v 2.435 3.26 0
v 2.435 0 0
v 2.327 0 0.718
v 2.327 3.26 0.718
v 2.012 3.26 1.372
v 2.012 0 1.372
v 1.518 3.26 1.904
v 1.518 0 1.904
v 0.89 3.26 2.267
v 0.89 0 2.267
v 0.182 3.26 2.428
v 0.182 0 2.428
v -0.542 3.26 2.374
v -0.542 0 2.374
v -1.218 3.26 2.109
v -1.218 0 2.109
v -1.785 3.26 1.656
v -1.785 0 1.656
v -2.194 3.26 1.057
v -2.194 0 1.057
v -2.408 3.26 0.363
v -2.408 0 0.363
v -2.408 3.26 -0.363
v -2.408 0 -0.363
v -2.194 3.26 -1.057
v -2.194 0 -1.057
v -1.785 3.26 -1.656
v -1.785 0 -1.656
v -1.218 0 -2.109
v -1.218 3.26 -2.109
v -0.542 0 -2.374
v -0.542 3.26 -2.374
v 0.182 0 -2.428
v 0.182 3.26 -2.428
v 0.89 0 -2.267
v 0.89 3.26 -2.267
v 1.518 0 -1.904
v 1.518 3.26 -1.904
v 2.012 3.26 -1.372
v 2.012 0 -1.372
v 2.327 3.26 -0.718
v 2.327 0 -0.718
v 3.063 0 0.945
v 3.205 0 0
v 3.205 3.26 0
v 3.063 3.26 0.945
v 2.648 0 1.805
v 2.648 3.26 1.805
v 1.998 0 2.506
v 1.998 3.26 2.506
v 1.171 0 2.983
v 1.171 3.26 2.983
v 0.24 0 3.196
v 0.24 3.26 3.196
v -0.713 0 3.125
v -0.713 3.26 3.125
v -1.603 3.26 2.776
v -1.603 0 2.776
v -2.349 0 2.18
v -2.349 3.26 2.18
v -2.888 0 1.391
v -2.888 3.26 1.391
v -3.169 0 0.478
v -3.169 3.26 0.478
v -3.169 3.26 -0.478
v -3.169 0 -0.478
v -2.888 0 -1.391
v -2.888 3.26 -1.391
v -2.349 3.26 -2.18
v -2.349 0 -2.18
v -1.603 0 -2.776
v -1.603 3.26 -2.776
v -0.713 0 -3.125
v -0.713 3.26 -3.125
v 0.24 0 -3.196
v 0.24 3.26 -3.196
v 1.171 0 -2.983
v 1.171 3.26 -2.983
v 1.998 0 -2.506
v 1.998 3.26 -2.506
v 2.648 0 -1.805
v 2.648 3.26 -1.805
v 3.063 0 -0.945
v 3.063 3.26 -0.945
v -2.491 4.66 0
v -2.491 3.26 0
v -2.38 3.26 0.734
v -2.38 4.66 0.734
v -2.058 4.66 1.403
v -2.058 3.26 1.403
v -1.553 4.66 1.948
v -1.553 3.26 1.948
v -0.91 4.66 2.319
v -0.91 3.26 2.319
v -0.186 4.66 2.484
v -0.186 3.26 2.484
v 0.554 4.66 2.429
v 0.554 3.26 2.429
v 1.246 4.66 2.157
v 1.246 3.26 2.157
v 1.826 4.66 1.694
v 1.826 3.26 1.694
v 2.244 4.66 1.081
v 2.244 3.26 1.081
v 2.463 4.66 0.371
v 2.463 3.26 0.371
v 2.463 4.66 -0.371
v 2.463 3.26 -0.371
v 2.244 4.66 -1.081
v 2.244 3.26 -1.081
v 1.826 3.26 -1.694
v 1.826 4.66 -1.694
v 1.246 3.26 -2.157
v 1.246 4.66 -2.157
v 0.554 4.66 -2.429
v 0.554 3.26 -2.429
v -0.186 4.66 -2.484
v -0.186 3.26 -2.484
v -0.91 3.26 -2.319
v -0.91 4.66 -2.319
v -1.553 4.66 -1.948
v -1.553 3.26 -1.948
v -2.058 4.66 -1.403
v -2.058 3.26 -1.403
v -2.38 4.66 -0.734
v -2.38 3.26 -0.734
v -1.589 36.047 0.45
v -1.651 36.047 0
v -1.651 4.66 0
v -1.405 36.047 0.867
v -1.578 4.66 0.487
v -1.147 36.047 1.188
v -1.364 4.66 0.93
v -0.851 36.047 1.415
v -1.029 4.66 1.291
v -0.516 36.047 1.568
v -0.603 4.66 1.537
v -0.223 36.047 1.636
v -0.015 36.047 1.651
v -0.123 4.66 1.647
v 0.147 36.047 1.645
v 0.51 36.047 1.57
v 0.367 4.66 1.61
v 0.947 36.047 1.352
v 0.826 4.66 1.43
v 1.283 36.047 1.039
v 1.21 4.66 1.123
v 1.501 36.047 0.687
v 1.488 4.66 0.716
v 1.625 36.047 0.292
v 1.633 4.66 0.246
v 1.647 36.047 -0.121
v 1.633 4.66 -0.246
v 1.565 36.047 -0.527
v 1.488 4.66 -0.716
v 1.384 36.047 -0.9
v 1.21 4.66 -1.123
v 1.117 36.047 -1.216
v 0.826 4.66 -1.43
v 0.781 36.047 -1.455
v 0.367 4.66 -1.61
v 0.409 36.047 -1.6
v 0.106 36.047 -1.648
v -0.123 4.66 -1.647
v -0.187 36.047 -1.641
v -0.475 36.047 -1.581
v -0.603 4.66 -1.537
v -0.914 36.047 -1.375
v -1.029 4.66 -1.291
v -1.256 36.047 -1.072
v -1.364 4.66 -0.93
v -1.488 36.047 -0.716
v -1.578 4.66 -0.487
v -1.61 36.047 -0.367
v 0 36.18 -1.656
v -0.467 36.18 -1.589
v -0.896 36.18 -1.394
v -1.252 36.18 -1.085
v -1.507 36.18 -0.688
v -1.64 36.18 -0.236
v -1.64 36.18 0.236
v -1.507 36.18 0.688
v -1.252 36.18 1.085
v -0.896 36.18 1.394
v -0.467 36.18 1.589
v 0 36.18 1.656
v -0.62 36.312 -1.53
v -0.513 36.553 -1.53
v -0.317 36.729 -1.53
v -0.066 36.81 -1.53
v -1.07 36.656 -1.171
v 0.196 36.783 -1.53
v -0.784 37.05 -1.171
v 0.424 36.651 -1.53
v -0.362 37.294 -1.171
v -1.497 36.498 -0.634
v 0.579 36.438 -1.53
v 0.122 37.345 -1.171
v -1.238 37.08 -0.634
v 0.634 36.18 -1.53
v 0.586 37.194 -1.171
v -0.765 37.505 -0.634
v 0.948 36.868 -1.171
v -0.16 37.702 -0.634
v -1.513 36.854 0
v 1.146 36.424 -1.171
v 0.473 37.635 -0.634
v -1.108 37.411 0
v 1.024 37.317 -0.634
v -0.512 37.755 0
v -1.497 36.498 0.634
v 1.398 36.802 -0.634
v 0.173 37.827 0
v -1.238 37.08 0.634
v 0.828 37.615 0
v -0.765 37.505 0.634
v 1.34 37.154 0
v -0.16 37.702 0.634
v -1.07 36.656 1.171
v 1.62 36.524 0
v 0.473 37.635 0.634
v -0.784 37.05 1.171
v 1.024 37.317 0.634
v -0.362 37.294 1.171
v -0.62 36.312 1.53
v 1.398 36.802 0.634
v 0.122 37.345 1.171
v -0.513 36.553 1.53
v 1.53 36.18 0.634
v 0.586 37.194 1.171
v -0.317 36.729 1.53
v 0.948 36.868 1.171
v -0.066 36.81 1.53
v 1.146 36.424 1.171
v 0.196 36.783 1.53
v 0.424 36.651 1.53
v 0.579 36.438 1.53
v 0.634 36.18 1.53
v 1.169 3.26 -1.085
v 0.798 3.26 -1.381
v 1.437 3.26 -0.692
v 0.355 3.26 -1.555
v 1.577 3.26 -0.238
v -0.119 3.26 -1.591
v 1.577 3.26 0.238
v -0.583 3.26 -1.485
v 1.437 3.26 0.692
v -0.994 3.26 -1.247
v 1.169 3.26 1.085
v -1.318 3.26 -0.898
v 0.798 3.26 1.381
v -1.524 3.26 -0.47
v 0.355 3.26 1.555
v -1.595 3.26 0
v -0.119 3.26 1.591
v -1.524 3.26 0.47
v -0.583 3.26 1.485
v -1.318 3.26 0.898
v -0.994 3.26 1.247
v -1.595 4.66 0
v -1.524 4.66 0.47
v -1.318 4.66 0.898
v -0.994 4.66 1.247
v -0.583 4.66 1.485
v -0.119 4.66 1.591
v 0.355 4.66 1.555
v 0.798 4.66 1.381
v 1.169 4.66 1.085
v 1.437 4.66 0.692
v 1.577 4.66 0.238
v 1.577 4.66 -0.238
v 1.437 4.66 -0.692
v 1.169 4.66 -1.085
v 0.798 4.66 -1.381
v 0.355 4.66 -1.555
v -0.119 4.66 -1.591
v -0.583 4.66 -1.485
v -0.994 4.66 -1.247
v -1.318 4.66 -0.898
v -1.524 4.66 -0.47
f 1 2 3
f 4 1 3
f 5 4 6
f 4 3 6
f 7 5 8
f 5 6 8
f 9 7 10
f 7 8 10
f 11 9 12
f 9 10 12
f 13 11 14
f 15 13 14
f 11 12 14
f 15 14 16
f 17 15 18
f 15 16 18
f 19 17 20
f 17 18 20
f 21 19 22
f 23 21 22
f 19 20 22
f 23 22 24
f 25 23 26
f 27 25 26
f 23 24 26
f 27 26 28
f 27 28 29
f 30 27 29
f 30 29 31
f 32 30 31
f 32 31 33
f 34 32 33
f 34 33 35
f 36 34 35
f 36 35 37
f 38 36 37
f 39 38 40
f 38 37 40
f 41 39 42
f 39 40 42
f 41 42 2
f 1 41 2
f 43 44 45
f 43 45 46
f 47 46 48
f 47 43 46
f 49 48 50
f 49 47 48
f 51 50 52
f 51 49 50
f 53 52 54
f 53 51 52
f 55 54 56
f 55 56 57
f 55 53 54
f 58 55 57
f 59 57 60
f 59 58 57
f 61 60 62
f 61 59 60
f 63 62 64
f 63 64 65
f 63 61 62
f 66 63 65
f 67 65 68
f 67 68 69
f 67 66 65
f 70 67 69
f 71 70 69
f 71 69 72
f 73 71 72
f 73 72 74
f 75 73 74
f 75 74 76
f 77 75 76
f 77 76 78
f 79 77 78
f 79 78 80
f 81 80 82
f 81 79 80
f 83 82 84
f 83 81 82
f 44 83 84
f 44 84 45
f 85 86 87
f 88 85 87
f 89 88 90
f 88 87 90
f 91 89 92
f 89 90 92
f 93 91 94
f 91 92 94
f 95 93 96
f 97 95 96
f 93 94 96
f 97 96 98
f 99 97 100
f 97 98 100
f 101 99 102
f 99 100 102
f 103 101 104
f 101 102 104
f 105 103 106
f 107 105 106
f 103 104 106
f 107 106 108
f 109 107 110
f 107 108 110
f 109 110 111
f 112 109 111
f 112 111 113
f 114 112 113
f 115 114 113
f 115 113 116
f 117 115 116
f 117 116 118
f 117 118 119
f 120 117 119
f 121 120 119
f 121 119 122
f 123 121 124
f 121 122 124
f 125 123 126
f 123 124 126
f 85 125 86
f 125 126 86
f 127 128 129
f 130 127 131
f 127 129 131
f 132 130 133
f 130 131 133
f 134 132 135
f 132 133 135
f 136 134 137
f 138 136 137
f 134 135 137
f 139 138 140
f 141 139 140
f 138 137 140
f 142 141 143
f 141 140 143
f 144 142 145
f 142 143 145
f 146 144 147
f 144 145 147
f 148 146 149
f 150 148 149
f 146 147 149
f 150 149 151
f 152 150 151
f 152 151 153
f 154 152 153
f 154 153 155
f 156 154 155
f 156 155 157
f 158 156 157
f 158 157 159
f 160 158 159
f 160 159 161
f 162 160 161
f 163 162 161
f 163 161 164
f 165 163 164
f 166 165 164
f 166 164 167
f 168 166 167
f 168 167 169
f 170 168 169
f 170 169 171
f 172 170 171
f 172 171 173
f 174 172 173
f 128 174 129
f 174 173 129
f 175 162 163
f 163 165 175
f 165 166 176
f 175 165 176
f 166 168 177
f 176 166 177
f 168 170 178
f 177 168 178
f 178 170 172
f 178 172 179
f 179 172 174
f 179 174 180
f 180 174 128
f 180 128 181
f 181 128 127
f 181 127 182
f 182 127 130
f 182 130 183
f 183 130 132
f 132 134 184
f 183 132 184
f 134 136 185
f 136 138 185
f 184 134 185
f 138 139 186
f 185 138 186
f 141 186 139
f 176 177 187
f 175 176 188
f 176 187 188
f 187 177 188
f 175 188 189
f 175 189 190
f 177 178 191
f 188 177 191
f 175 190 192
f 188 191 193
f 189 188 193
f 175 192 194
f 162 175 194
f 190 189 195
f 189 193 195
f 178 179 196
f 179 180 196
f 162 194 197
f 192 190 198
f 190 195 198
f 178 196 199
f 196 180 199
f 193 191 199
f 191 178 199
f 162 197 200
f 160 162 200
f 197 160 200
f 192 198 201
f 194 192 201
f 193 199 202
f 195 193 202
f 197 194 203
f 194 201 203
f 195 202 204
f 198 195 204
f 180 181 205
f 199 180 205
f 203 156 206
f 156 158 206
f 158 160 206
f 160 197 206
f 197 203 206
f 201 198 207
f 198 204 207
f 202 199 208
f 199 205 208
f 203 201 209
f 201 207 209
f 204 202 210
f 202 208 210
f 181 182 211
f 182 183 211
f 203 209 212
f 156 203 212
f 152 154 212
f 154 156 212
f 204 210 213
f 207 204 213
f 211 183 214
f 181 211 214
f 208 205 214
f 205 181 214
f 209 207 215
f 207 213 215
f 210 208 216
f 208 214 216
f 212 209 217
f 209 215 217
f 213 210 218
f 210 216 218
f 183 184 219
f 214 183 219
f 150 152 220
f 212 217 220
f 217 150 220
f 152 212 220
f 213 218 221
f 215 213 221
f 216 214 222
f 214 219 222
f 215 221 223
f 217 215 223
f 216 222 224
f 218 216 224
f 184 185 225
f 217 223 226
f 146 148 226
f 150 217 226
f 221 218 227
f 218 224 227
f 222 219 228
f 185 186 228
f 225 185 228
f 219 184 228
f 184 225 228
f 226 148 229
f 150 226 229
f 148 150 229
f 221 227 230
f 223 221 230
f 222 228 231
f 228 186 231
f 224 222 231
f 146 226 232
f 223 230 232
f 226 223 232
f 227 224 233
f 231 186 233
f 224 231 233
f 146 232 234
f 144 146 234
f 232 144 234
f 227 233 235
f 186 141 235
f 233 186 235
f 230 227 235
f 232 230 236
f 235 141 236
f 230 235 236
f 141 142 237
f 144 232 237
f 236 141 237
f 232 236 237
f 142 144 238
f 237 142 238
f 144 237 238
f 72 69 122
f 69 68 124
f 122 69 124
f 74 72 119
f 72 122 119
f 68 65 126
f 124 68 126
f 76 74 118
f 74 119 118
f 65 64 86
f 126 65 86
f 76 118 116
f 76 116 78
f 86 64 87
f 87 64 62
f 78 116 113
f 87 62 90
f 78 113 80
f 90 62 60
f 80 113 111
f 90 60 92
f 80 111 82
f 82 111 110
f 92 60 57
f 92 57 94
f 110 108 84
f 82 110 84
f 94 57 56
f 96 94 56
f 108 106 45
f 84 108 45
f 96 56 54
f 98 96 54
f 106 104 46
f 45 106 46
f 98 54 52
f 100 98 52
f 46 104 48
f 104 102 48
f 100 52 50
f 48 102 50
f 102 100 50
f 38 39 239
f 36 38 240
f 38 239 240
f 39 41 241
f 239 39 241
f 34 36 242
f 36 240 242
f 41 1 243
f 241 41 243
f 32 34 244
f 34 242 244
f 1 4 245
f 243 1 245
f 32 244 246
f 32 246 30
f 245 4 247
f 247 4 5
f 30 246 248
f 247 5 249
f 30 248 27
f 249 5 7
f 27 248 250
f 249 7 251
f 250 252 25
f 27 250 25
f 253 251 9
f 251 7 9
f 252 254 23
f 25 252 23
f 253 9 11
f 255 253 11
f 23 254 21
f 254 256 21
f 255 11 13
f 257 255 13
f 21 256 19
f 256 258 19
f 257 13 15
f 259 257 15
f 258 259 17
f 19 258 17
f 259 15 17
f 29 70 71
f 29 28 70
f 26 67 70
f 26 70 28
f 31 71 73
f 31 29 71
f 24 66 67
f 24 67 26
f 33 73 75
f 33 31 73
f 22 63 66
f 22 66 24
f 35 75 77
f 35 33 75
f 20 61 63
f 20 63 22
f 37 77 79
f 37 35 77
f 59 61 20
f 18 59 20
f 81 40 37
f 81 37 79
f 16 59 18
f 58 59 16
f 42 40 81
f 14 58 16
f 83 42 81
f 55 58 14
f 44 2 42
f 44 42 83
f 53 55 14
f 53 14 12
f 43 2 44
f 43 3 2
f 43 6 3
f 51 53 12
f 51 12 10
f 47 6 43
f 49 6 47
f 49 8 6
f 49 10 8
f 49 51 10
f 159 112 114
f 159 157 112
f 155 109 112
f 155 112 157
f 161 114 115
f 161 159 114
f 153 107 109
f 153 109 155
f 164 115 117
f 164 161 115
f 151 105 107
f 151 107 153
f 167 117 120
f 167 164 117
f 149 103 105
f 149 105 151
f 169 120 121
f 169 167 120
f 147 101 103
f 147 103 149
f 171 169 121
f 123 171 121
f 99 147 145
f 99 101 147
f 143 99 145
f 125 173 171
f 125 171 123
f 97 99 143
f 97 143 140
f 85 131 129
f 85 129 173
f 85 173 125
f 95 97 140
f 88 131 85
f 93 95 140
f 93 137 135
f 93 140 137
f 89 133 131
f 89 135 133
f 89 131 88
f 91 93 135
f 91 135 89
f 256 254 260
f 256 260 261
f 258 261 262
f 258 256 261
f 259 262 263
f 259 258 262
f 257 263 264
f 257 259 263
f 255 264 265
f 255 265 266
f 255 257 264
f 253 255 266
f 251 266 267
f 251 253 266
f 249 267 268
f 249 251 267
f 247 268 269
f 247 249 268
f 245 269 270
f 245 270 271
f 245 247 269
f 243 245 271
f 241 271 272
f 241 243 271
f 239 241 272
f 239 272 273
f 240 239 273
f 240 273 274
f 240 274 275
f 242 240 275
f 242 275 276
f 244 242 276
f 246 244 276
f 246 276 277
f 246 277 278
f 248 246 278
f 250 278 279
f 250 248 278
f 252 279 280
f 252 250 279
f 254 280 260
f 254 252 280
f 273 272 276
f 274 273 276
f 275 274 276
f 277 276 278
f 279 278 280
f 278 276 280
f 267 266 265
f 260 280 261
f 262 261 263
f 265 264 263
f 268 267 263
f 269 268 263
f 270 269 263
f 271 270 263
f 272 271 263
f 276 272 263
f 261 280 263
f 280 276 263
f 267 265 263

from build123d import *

# Parameters (mm, degrees)
F0_R     = 3.205
F0_R_2   = 2.435
F1_DEPTH = 3.26
F2_R     = 2.491032
F2_R_2   = 1.595
F3_DEPTH = 1.4
F4_R     = 1.651158
F5_DEPTH = 31.52


with BuildPart() as f1:
    # F0 (on Front) → F1 (new body)
    with BuildSketch(Plane.XZ):
        Circle(F0_R)
        Circle(F0_R_2, mode=Mode.SUBTRACT)
    extrude(amount=-F1_DEPTH)

    # F2 (on face) → F3 (join)
    with BuildSketch(Plane(origin=(0, 3.26, 0), x_dir=(-1, 0, 0), z_dir=(0, 1, 0))):
        Circle(F2_R)
        Circle(F2_R_2, mode=Mode.SUBTRACT)
    extrude(amount=F3_DEPTH)

    # F4 (on face) → F5 (join)
    with BuildSketch(Plane(origin=(0, 4.66, 0), x_dir=(-1, 0, 0), z_dir=(0, 1, 0))):
        Circle(F4_R)
    extrude(amount=F5_DEPTH)

    # F7 (on face) → F8 (revolve)
    with BuildSketch(Plane(origin=(0, 36.18, 0), x_dir=(-1, 0, 0), z_dir=(0, 1, 0))):
        with BuildLine():
            Line((0, 1.656466), (0, -1.656466))
            ThreePointArc((0, -1.656466), (1.656466, 0), (0, 1.656466))
        make_face()
    revolve(axis=Axis((0, 36.18, 0), (0, 0, -1)))


solid = f1.part
